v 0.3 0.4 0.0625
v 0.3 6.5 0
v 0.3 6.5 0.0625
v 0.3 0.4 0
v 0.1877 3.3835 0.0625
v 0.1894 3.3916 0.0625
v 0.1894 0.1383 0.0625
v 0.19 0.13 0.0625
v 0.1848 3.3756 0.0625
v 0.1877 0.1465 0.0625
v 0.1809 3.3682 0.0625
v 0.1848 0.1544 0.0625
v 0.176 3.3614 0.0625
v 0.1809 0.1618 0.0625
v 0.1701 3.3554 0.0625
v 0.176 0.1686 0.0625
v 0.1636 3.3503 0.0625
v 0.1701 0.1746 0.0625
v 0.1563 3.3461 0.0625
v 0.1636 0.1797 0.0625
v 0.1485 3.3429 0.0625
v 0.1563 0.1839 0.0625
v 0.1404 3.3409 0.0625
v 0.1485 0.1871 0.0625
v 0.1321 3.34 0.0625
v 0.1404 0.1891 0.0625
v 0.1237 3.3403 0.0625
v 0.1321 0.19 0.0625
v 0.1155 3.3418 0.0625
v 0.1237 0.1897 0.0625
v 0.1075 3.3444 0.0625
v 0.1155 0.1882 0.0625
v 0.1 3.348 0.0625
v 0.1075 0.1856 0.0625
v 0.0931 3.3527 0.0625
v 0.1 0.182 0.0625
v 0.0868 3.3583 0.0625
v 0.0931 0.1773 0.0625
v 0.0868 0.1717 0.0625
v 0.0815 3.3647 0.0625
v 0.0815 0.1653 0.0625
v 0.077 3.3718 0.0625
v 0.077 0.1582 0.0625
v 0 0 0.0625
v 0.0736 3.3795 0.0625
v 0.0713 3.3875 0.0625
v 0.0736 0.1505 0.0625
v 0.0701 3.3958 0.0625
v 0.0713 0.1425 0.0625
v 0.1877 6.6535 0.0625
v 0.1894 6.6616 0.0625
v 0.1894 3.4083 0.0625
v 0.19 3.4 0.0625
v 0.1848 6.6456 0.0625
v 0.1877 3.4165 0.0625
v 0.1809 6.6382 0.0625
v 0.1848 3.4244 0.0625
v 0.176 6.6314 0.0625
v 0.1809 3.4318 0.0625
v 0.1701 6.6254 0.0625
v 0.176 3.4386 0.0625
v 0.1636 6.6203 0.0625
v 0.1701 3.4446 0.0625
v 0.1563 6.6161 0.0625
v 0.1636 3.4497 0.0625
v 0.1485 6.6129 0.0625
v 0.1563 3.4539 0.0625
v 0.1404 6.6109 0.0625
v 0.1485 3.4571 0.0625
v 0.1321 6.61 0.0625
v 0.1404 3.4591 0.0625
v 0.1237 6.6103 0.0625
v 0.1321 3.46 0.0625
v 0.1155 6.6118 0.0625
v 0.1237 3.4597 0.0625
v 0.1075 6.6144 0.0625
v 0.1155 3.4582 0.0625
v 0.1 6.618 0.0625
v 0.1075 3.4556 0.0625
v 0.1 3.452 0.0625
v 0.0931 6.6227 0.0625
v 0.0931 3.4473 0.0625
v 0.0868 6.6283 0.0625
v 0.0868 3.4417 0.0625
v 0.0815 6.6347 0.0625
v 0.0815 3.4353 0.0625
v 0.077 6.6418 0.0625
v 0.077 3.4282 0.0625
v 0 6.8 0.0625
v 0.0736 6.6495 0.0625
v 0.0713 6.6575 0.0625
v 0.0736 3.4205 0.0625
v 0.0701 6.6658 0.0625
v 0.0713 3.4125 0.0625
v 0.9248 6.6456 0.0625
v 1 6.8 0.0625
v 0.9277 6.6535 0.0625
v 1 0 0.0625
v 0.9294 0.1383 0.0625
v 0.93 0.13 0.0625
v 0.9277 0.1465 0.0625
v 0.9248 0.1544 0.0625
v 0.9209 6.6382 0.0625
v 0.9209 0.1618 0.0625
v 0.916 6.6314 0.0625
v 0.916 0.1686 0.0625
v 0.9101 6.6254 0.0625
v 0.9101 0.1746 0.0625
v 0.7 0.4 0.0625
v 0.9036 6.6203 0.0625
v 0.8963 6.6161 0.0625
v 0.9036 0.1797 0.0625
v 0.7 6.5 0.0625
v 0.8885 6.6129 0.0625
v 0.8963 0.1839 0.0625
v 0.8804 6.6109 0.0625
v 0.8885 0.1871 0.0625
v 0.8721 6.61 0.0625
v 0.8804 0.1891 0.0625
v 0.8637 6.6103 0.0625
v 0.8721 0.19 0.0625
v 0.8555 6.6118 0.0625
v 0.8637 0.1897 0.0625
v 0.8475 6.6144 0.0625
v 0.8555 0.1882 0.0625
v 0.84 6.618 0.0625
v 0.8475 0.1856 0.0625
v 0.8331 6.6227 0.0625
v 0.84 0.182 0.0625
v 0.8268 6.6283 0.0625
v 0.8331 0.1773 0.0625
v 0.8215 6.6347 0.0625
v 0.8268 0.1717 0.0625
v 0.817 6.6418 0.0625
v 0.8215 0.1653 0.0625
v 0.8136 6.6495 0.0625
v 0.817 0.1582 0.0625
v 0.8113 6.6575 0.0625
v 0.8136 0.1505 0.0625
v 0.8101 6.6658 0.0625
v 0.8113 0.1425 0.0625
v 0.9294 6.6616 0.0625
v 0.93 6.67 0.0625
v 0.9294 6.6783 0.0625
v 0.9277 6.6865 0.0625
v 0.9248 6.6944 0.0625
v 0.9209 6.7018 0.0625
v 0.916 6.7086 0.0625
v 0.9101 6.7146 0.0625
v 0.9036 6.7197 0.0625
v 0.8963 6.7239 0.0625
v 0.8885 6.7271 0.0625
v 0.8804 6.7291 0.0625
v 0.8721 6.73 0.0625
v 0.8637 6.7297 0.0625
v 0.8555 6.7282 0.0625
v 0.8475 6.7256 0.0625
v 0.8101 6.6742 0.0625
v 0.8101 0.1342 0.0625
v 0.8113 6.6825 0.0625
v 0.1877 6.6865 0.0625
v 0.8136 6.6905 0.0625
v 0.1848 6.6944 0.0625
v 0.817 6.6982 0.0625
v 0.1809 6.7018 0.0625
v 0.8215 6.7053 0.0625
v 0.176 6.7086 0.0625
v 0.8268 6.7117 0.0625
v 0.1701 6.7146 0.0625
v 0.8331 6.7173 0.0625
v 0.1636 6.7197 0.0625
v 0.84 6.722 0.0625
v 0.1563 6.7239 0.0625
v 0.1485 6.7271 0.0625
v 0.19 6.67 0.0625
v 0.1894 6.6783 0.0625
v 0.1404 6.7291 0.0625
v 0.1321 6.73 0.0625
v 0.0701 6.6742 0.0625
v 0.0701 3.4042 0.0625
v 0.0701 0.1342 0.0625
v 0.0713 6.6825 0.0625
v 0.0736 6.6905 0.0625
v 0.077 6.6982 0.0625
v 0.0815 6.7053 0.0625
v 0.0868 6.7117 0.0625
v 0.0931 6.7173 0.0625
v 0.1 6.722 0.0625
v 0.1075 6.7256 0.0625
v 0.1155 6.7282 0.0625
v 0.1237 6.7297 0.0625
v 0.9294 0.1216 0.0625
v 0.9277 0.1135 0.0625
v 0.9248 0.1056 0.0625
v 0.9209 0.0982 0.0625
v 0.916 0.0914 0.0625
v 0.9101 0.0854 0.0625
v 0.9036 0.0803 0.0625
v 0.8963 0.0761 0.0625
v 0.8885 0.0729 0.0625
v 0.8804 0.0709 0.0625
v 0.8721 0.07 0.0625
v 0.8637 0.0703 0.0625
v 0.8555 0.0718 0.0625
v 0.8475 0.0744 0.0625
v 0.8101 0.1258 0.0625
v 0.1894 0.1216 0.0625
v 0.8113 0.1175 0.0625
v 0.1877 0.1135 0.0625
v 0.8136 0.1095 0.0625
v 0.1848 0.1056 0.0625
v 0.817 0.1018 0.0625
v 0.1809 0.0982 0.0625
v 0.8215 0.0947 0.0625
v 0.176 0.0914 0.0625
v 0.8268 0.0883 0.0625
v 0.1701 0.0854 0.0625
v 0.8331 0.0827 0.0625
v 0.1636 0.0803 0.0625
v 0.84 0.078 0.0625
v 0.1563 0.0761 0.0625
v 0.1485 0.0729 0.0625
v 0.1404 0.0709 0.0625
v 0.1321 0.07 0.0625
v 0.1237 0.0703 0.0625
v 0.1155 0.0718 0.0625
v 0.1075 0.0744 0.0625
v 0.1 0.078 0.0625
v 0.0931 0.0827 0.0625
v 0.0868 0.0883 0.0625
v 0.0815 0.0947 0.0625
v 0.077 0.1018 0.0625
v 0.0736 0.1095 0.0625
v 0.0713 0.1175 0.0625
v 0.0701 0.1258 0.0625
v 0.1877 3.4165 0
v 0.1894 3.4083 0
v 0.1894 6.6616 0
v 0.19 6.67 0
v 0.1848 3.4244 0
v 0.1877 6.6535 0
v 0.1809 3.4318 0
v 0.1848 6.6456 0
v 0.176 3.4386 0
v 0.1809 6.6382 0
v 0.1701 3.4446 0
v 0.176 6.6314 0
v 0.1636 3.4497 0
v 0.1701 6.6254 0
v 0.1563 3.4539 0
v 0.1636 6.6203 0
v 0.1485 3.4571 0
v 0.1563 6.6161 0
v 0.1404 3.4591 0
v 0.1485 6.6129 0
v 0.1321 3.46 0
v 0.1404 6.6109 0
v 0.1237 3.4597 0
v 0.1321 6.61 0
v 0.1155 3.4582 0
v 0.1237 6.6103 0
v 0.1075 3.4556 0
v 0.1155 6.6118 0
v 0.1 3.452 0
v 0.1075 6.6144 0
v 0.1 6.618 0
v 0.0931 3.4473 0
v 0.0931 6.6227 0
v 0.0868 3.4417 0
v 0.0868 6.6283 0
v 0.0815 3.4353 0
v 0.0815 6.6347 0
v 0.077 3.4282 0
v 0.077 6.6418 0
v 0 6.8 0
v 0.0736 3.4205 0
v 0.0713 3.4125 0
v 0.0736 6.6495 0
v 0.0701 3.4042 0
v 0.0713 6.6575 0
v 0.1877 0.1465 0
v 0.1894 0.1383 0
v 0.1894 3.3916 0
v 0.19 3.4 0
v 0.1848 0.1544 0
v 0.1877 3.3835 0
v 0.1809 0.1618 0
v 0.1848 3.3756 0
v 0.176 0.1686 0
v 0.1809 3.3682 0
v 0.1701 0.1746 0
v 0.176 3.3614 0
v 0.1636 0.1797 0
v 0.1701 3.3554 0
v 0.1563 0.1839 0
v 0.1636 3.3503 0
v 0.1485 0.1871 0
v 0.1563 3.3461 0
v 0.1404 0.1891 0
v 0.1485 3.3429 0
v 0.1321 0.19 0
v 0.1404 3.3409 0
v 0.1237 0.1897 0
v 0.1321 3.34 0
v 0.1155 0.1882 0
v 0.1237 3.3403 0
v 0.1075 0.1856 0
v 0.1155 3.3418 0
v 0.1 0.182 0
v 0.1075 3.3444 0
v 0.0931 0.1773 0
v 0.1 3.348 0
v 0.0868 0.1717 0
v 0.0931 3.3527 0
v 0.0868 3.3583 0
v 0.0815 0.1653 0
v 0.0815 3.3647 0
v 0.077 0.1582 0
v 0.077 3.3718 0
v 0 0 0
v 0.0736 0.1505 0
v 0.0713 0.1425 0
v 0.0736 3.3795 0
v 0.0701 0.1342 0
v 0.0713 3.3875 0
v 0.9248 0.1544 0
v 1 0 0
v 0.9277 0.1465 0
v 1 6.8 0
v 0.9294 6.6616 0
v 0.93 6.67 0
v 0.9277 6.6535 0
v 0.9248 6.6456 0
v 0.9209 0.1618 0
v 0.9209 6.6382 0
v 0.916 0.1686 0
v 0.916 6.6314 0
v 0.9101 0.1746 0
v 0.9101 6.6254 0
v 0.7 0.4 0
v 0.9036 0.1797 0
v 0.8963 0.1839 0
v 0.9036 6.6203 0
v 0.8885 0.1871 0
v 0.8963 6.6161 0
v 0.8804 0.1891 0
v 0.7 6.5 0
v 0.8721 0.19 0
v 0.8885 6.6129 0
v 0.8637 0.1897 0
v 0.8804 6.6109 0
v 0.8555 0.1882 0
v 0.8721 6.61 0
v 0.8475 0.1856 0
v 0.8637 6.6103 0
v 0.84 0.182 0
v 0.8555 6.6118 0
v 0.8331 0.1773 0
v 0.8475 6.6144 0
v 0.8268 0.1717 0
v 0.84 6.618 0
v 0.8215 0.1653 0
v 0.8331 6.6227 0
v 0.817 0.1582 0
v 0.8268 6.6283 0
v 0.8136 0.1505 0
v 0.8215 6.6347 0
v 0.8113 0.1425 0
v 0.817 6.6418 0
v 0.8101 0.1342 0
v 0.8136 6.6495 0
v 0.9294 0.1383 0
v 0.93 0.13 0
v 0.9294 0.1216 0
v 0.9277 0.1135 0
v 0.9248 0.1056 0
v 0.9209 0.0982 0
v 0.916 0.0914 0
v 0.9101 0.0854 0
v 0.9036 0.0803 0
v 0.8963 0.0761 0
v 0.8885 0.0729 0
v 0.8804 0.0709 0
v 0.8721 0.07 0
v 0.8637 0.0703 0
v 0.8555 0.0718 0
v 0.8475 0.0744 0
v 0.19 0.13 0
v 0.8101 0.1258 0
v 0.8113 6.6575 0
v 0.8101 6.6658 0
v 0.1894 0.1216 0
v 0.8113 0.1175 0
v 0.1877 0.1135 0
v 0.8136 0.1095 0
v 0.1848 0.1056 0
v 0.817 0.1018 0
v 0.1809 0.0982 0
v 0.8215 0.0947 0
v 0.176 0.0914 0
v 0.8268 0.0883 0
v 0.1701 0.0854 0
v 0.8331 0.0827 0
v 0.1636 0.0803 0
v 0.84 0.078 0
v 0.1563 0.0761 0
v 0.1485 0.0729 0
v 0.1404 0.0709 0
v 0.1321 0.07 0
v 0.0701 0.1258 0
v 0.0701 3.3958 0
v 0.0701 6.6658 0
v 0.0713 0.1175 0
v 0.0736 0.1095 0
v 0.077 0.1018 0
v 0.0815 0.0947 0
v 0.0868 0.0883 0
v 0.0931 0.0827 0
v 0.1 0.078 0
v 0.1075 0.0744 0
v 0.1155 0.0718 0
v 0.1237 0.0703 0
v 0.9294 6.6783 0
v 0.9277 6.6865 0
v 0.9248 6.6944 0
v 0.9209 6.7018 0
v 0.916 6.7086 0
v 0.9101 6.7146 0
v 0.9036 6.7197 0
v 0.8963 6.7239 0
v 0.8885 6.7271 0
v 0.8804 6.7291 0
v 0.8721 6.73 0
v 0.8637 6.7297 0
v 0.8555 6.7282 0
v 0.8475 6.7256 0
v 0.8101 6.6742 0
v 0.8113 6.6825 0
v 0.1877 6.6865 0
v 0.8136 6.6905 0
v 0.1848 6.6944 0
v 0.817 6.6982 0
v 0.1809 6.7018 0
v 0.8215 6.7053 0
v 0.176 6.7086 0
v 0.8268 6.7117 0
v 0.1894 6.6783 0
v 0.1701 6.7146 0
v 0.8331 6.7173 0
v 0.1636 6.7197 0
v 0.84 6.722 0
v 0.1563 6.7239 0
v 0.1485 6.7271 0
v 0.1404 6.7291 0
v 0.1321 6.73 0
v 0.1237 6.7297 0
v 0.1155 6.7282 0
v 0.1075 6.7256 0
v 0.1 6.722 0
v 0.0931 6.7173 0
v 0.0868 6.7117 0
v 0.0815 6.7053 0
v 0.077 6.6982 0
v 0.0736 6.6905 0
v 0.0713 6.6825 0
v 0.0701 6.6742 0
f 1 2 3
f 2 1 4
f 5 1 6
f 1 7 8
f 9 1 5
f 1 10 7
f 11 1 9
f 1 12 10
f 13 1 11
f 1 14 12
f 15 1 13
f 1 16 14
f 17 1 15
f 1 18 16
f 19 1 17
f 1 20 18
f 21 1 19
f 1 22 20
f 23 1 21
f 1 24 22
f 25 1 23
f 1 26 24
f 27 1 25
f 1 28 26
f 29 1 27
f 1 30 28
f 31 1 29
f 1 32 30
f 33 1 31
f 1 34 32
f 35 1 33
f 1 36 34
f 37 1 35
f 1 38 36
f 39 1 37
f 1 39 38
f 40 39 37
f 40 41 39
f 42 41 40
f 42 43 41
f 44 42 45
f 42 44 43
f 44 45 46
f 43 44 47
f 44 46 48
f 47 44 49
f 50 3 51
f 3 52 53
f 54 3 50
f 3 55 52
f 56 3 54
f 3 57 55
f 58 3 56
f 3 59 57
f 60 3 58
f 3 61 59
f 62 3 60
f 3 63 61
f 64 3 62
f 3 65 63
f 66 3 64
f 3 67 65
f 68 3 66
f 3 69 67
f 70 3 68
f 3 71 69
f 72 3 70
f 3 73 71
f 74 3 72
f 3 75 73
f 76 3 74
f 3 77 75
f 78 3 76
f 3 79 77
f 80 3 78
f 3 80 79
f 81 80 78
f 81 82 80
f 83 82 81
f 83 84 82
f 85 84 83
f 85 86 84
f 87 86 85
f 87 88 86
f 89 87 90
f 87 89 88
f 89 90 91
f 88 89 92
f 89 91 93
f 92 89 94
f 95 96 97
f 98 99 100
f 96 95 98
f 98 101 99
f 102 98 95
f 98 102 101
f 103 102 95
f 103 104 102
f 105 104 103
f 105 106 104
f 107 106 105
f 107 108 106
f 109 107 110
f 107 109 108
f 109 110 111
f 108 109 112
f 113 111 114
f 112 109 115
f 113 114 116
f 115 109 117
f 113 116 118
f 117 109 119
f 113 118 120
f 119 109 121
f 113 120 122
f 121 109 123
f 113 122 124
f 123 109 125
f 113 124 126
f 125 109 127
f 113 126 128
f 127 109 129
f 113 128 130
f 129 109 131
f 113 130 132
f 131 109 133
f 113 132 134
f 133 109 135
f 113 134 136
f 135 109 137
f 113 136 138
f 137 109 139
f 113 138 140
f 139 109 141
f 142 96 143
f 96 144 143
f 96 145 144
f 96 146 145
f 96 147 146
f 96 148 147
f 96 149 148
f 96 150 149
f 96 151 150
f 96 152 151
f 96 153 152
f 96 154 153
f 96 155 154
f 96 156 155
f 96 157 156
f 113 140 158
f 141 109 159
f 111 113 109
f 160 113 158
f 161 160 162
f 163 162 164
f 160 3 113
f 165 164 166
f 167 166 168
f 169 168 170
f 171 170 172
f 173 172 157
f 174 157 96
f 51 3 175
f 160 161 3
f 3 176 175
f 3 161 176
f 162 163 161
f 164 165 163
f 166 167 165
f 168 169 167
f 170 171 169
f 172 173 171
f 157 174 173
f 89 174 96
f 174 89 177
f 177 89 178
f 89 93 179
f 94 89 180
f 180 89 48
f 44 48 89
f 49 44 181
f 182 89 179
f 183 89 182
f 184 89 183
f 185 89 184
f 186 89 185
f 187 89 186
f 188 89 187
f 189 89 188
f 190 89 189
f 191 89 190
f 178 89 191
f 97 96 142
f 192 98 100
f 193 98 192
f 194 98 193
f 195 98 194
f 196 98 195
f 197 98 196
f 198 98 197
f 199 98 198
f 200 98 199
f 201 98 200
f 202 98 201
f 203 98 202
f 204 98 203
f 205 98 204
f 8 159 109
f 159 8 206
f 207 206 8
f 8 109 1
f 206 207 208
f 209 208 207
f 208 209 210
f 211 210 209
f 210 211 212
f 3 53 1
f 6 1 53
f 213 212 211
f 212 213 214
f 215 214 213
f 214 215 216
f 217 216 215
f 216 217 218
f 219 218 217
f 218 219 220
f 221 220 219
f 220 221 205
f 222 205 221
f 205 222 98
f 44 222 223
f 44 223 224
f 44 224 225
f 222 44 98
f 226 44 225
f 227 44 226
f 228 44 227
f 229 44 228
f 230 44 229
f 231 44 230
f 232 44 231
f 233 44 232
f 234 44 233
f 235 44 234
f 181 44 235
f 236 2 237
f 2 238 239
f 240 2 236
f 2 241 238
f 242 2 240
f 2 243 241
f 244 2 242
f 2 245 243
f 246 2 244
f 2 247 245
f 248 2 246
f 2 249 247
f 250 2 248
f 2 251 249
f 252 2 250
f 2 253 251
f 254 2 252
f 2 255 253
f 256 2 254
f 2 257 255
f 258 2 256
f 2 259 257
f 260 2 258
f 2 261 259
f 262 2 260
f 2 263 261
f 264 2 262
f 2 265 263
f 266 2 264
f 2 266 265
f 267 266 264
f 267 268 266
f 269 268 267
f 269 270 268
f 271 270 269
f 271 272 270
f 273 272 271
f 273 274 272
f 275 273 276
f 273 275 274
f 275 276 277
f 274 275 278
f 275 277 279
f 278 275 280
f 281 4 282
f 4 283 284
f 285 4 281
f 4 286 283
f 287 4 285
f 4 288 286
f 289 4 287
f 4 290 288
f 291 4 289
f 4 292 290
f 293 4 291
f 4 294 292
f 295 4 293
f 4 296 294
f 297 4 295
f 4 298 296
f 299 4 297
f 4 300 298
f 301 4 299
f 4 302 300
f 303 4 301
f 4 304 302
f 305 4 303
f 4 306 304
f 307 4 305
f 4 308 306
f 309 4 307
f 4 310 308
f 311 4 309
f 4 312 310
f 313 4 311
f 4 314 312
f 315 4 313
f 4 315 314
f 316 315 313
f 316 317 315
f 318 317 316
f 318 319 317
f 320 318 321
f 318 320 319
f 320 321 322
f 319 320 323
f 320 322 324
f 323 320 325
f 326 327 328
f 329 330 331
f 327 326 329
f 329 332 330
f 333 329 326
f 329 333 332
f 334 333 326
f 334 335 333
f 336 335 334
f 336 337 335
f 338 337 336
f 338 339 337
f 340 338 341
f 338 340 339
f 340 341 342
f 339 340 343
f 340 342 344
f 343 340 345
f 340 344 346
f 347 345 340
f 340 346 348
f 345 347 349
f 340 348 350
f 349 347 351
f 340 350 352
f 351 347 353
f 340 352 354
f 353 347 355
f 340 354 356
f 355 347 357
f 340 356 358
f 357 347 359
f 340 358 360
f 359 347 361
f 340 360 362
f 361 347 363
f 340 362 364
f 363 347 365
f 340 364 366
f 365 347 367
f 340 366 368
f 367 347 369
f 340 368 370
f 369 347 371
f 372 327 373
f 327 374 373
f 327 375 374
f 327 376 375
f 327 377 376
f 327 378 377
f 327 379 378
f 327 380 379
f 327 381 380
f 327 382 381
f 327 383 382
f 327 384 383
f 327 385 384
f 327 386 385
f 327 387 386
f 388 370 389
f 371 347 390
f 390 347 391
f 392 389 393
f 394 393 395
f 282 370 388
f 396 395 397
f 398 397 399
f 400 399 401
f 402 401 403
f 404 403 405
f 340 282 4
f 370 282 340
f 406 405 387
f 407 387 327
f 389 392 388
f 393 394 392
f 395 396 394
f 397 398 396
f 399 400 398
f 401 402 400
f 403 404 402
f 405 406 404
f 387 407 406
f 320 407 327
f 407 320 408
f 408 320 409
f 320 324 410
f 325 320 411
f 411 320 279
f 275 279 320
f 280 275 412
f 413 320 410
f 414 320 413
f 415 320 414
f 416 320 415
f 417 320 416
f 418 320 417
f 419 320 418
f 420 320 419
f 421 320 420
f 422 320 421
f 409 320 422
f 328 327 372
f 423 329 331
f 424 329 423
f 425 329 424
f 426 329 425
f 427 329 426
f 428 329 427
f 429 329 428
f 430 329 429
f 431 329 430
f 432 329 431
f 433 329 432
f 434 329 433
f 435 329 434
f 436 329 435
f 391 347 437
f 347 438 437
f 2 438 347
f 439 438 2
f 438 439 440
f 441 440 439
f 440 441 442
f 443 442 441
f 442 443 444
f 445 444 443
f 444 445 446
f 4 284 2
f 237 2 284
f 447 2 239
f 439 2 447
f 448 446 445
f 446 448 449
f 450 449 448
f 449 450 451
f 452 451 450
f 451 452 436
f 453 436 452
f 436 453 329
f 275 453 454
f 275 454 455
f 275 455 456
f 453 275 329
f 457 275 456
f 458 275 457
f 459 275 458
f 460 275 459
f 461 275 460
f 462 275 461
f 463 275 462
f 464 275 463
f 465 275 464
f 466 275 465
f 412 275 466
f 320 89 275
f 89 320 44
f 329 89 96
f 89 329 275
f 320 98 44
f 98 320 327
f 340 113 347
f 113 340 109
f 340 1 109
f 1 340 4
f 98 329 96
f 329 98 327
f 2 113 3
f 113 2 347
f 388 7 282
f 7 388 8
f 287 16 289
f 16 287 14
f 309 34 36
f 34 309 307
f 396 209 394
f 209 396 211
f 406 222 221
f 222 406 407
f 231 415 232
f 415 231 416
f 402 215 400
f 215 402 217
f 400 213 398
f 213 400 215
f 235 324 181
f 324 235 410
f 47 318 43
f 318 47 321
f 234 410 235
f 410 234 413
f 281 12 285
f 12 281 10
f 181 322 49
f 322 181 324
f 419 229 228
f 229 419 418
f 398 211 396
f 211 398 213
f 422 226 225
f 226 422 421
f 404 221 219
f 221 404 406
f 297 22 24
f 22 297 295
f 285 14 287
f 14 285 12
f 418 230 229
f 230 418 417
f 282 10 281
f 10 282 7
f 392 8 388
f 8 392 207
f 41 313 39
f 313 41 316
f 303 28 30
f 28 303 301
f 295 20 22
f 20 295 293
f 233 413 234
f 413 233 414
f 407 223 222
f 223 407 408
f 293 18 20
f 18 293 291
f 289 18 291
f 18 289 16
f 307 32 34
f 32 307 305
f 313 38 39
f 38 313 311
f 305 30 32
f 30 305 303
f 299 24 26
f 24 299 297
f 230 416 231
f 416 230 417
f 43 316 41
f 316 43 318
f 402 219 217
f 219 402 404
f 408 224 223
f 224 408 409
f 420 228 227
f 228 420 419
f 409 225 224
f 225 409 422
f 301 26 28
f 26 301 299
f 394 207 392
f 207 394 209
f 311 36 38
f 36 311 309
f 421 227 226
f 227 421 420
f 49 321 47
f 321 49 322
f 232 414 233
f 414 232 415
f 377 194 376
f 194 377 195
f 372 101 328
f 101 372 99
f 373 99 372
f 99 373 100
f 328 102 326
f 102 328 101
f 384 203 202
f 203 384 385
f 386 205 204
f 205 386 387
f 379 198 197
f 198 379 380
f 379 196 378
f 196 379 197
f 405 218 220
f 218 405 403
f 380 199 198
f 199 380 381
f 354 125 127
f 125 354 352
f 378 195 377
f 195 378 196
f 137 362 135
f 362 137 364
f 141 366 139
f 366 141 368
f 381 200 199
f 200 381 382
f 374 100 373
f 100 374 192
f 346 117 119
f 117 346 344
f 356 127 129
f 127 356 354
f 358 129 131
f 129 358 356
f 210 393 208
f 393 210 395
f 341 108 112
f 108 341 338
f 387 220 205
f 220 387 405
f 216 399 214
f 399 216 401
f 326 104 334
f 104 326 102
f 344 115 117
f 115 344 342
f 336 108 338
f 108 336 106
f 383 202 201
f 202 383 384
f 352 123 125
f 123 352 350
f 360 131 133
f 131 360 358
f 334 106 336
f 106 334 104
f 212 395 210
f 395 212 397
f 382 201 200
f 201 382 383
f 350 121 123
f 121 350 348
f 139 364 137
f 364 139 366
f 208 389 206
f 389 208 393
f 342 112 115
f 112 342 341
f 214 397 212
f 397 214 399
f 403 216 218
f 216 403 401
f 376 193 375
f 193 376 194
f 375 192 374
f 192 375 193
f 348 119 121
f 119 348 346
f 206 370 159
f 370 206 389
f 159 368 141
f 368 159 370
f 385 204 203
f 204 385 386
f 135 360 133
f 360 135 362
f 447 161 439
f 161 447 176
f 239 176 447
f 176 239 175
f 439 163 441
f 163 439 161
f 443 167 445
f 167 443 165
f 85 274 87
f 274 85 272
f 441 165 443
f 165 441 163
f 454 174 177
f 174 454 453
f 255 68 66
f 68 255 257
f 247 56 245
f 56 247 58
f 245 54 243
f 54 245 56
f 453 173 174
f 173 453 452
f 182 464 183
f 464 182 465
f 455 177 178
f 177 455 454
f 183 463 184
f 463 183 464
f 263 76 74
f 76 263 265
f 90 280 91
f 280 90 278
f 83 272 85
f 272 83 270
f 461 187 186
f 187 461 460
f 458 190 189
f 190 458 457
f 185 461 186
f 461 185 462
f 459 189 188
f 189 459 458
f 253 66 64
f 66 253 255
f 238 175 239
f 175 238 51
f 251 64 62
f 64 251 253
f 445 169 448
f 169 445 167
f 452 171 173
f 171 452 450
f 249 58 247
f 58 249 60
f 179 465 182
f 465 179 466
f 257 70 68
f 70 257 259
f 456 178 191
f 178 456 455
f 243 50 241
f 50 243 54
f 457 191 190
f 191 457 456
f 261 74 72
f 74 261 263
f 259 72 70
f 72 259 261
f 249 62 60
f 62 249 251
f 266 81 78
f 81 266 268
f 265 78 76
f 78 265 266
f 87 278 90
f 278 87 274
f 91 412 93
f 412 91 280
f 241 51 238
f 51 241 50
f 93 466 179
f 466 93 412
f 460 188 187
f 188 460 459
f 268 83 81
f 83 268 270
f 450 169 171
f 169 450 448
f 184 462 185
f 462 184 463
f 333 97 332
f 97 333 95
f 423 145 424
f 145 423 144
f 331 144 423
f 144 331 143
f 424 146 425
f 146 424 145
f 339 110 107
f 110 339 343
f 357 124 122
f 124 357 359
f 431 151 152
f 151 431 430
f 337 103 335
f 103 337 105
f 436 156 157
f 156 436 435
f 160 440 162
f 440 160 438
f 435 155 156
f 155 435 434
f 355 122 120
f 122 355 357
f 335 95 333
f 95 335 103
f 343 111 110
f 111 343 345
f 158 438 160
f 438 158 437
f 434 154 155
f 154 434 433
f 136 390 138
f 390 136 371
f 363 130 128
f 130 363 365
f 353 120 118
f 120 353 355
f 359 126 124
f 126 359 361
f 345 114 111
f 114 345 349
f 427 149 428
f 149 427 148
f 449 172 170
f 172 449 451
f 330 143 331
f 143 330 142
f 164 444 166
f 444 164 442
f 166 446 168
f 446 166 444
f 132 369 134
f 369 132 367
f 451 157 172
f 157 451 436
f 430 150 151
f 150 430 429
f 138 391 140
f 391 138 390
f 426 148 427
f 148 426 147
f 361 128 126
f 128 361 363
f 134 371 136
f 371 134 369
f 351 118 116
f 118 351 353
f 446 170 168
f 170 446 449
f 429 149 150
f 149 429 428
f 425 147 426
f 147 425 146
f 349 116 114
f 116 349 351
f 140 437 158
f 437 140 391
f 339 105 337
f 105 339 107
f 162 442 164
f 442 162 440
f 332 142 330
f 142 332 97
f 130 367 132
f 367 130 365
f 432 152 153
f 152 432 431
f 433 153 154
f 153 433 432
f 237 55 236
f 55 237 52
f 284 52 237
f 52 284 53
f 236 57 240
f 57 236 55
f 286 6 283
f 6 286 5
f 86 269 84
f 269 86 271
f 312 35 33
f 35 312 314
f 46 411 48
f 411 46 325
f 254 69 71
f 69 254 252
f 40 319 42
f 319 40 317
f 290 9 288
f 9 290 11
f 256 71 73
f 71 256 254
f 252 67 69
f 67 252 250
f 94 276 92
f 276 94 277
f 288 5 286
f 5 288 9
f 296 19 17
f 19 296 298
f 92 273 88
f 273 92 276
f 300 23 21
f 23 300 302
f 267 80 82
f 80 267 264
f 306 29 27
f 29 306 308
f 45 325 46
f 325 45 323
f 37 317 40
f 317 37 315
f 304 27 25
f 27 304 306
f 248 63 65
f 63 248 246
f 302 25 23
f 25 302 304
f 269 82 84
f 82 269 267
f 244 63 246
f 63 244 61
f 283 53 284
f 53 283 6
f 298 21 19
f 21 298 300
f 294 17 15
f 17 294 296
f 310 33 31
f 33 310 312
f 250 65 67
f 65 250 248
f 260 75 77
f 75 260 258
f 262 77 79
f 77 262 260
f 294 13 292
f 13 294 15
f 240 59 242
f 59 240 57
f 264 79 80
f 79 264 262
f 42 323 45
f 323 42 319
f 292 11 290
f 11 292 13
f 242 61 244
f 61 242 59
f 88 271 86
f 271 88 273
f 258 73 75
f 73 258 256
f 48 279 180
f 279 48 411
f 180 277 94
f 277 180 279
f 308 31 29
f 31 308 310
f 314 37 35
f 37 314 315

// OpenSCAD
difference(){
union(){
cube([0.3, 6.8, 0.0625]);
translate([0.3, 0.0]) {
    cube([0.4,0.4, 0.0625]);
    };
    translate([0.7,0,0]) {
        cube([0.3, 6.8, 0.0625]);
        };
 translate([0.3,6.5,0.0]){
     cube([0.4,0.3, 0.0625]);
 };
};

translate([0.13,0.13,-0.05]){
cylinder(0.1625,0.06, 0.06, $fn=45);
};
translate([0.87,0.13,-0.05]){
cylinder(0.1625,0.06, 0.06, $fn=45);
};

translate([0.13,6.67,-0.05]){
cylinder(0.1625,0.06, 0.06, $fn=45);
};
translate([0.87,6.67,-0.05]){
cylinder(0.1625,0.06, 0.06, $fn=45);
};

translate([0.13,3.4,-0.05]){
cylinder(0.1625,0.06, 0.06, $fn=45);
};


};
